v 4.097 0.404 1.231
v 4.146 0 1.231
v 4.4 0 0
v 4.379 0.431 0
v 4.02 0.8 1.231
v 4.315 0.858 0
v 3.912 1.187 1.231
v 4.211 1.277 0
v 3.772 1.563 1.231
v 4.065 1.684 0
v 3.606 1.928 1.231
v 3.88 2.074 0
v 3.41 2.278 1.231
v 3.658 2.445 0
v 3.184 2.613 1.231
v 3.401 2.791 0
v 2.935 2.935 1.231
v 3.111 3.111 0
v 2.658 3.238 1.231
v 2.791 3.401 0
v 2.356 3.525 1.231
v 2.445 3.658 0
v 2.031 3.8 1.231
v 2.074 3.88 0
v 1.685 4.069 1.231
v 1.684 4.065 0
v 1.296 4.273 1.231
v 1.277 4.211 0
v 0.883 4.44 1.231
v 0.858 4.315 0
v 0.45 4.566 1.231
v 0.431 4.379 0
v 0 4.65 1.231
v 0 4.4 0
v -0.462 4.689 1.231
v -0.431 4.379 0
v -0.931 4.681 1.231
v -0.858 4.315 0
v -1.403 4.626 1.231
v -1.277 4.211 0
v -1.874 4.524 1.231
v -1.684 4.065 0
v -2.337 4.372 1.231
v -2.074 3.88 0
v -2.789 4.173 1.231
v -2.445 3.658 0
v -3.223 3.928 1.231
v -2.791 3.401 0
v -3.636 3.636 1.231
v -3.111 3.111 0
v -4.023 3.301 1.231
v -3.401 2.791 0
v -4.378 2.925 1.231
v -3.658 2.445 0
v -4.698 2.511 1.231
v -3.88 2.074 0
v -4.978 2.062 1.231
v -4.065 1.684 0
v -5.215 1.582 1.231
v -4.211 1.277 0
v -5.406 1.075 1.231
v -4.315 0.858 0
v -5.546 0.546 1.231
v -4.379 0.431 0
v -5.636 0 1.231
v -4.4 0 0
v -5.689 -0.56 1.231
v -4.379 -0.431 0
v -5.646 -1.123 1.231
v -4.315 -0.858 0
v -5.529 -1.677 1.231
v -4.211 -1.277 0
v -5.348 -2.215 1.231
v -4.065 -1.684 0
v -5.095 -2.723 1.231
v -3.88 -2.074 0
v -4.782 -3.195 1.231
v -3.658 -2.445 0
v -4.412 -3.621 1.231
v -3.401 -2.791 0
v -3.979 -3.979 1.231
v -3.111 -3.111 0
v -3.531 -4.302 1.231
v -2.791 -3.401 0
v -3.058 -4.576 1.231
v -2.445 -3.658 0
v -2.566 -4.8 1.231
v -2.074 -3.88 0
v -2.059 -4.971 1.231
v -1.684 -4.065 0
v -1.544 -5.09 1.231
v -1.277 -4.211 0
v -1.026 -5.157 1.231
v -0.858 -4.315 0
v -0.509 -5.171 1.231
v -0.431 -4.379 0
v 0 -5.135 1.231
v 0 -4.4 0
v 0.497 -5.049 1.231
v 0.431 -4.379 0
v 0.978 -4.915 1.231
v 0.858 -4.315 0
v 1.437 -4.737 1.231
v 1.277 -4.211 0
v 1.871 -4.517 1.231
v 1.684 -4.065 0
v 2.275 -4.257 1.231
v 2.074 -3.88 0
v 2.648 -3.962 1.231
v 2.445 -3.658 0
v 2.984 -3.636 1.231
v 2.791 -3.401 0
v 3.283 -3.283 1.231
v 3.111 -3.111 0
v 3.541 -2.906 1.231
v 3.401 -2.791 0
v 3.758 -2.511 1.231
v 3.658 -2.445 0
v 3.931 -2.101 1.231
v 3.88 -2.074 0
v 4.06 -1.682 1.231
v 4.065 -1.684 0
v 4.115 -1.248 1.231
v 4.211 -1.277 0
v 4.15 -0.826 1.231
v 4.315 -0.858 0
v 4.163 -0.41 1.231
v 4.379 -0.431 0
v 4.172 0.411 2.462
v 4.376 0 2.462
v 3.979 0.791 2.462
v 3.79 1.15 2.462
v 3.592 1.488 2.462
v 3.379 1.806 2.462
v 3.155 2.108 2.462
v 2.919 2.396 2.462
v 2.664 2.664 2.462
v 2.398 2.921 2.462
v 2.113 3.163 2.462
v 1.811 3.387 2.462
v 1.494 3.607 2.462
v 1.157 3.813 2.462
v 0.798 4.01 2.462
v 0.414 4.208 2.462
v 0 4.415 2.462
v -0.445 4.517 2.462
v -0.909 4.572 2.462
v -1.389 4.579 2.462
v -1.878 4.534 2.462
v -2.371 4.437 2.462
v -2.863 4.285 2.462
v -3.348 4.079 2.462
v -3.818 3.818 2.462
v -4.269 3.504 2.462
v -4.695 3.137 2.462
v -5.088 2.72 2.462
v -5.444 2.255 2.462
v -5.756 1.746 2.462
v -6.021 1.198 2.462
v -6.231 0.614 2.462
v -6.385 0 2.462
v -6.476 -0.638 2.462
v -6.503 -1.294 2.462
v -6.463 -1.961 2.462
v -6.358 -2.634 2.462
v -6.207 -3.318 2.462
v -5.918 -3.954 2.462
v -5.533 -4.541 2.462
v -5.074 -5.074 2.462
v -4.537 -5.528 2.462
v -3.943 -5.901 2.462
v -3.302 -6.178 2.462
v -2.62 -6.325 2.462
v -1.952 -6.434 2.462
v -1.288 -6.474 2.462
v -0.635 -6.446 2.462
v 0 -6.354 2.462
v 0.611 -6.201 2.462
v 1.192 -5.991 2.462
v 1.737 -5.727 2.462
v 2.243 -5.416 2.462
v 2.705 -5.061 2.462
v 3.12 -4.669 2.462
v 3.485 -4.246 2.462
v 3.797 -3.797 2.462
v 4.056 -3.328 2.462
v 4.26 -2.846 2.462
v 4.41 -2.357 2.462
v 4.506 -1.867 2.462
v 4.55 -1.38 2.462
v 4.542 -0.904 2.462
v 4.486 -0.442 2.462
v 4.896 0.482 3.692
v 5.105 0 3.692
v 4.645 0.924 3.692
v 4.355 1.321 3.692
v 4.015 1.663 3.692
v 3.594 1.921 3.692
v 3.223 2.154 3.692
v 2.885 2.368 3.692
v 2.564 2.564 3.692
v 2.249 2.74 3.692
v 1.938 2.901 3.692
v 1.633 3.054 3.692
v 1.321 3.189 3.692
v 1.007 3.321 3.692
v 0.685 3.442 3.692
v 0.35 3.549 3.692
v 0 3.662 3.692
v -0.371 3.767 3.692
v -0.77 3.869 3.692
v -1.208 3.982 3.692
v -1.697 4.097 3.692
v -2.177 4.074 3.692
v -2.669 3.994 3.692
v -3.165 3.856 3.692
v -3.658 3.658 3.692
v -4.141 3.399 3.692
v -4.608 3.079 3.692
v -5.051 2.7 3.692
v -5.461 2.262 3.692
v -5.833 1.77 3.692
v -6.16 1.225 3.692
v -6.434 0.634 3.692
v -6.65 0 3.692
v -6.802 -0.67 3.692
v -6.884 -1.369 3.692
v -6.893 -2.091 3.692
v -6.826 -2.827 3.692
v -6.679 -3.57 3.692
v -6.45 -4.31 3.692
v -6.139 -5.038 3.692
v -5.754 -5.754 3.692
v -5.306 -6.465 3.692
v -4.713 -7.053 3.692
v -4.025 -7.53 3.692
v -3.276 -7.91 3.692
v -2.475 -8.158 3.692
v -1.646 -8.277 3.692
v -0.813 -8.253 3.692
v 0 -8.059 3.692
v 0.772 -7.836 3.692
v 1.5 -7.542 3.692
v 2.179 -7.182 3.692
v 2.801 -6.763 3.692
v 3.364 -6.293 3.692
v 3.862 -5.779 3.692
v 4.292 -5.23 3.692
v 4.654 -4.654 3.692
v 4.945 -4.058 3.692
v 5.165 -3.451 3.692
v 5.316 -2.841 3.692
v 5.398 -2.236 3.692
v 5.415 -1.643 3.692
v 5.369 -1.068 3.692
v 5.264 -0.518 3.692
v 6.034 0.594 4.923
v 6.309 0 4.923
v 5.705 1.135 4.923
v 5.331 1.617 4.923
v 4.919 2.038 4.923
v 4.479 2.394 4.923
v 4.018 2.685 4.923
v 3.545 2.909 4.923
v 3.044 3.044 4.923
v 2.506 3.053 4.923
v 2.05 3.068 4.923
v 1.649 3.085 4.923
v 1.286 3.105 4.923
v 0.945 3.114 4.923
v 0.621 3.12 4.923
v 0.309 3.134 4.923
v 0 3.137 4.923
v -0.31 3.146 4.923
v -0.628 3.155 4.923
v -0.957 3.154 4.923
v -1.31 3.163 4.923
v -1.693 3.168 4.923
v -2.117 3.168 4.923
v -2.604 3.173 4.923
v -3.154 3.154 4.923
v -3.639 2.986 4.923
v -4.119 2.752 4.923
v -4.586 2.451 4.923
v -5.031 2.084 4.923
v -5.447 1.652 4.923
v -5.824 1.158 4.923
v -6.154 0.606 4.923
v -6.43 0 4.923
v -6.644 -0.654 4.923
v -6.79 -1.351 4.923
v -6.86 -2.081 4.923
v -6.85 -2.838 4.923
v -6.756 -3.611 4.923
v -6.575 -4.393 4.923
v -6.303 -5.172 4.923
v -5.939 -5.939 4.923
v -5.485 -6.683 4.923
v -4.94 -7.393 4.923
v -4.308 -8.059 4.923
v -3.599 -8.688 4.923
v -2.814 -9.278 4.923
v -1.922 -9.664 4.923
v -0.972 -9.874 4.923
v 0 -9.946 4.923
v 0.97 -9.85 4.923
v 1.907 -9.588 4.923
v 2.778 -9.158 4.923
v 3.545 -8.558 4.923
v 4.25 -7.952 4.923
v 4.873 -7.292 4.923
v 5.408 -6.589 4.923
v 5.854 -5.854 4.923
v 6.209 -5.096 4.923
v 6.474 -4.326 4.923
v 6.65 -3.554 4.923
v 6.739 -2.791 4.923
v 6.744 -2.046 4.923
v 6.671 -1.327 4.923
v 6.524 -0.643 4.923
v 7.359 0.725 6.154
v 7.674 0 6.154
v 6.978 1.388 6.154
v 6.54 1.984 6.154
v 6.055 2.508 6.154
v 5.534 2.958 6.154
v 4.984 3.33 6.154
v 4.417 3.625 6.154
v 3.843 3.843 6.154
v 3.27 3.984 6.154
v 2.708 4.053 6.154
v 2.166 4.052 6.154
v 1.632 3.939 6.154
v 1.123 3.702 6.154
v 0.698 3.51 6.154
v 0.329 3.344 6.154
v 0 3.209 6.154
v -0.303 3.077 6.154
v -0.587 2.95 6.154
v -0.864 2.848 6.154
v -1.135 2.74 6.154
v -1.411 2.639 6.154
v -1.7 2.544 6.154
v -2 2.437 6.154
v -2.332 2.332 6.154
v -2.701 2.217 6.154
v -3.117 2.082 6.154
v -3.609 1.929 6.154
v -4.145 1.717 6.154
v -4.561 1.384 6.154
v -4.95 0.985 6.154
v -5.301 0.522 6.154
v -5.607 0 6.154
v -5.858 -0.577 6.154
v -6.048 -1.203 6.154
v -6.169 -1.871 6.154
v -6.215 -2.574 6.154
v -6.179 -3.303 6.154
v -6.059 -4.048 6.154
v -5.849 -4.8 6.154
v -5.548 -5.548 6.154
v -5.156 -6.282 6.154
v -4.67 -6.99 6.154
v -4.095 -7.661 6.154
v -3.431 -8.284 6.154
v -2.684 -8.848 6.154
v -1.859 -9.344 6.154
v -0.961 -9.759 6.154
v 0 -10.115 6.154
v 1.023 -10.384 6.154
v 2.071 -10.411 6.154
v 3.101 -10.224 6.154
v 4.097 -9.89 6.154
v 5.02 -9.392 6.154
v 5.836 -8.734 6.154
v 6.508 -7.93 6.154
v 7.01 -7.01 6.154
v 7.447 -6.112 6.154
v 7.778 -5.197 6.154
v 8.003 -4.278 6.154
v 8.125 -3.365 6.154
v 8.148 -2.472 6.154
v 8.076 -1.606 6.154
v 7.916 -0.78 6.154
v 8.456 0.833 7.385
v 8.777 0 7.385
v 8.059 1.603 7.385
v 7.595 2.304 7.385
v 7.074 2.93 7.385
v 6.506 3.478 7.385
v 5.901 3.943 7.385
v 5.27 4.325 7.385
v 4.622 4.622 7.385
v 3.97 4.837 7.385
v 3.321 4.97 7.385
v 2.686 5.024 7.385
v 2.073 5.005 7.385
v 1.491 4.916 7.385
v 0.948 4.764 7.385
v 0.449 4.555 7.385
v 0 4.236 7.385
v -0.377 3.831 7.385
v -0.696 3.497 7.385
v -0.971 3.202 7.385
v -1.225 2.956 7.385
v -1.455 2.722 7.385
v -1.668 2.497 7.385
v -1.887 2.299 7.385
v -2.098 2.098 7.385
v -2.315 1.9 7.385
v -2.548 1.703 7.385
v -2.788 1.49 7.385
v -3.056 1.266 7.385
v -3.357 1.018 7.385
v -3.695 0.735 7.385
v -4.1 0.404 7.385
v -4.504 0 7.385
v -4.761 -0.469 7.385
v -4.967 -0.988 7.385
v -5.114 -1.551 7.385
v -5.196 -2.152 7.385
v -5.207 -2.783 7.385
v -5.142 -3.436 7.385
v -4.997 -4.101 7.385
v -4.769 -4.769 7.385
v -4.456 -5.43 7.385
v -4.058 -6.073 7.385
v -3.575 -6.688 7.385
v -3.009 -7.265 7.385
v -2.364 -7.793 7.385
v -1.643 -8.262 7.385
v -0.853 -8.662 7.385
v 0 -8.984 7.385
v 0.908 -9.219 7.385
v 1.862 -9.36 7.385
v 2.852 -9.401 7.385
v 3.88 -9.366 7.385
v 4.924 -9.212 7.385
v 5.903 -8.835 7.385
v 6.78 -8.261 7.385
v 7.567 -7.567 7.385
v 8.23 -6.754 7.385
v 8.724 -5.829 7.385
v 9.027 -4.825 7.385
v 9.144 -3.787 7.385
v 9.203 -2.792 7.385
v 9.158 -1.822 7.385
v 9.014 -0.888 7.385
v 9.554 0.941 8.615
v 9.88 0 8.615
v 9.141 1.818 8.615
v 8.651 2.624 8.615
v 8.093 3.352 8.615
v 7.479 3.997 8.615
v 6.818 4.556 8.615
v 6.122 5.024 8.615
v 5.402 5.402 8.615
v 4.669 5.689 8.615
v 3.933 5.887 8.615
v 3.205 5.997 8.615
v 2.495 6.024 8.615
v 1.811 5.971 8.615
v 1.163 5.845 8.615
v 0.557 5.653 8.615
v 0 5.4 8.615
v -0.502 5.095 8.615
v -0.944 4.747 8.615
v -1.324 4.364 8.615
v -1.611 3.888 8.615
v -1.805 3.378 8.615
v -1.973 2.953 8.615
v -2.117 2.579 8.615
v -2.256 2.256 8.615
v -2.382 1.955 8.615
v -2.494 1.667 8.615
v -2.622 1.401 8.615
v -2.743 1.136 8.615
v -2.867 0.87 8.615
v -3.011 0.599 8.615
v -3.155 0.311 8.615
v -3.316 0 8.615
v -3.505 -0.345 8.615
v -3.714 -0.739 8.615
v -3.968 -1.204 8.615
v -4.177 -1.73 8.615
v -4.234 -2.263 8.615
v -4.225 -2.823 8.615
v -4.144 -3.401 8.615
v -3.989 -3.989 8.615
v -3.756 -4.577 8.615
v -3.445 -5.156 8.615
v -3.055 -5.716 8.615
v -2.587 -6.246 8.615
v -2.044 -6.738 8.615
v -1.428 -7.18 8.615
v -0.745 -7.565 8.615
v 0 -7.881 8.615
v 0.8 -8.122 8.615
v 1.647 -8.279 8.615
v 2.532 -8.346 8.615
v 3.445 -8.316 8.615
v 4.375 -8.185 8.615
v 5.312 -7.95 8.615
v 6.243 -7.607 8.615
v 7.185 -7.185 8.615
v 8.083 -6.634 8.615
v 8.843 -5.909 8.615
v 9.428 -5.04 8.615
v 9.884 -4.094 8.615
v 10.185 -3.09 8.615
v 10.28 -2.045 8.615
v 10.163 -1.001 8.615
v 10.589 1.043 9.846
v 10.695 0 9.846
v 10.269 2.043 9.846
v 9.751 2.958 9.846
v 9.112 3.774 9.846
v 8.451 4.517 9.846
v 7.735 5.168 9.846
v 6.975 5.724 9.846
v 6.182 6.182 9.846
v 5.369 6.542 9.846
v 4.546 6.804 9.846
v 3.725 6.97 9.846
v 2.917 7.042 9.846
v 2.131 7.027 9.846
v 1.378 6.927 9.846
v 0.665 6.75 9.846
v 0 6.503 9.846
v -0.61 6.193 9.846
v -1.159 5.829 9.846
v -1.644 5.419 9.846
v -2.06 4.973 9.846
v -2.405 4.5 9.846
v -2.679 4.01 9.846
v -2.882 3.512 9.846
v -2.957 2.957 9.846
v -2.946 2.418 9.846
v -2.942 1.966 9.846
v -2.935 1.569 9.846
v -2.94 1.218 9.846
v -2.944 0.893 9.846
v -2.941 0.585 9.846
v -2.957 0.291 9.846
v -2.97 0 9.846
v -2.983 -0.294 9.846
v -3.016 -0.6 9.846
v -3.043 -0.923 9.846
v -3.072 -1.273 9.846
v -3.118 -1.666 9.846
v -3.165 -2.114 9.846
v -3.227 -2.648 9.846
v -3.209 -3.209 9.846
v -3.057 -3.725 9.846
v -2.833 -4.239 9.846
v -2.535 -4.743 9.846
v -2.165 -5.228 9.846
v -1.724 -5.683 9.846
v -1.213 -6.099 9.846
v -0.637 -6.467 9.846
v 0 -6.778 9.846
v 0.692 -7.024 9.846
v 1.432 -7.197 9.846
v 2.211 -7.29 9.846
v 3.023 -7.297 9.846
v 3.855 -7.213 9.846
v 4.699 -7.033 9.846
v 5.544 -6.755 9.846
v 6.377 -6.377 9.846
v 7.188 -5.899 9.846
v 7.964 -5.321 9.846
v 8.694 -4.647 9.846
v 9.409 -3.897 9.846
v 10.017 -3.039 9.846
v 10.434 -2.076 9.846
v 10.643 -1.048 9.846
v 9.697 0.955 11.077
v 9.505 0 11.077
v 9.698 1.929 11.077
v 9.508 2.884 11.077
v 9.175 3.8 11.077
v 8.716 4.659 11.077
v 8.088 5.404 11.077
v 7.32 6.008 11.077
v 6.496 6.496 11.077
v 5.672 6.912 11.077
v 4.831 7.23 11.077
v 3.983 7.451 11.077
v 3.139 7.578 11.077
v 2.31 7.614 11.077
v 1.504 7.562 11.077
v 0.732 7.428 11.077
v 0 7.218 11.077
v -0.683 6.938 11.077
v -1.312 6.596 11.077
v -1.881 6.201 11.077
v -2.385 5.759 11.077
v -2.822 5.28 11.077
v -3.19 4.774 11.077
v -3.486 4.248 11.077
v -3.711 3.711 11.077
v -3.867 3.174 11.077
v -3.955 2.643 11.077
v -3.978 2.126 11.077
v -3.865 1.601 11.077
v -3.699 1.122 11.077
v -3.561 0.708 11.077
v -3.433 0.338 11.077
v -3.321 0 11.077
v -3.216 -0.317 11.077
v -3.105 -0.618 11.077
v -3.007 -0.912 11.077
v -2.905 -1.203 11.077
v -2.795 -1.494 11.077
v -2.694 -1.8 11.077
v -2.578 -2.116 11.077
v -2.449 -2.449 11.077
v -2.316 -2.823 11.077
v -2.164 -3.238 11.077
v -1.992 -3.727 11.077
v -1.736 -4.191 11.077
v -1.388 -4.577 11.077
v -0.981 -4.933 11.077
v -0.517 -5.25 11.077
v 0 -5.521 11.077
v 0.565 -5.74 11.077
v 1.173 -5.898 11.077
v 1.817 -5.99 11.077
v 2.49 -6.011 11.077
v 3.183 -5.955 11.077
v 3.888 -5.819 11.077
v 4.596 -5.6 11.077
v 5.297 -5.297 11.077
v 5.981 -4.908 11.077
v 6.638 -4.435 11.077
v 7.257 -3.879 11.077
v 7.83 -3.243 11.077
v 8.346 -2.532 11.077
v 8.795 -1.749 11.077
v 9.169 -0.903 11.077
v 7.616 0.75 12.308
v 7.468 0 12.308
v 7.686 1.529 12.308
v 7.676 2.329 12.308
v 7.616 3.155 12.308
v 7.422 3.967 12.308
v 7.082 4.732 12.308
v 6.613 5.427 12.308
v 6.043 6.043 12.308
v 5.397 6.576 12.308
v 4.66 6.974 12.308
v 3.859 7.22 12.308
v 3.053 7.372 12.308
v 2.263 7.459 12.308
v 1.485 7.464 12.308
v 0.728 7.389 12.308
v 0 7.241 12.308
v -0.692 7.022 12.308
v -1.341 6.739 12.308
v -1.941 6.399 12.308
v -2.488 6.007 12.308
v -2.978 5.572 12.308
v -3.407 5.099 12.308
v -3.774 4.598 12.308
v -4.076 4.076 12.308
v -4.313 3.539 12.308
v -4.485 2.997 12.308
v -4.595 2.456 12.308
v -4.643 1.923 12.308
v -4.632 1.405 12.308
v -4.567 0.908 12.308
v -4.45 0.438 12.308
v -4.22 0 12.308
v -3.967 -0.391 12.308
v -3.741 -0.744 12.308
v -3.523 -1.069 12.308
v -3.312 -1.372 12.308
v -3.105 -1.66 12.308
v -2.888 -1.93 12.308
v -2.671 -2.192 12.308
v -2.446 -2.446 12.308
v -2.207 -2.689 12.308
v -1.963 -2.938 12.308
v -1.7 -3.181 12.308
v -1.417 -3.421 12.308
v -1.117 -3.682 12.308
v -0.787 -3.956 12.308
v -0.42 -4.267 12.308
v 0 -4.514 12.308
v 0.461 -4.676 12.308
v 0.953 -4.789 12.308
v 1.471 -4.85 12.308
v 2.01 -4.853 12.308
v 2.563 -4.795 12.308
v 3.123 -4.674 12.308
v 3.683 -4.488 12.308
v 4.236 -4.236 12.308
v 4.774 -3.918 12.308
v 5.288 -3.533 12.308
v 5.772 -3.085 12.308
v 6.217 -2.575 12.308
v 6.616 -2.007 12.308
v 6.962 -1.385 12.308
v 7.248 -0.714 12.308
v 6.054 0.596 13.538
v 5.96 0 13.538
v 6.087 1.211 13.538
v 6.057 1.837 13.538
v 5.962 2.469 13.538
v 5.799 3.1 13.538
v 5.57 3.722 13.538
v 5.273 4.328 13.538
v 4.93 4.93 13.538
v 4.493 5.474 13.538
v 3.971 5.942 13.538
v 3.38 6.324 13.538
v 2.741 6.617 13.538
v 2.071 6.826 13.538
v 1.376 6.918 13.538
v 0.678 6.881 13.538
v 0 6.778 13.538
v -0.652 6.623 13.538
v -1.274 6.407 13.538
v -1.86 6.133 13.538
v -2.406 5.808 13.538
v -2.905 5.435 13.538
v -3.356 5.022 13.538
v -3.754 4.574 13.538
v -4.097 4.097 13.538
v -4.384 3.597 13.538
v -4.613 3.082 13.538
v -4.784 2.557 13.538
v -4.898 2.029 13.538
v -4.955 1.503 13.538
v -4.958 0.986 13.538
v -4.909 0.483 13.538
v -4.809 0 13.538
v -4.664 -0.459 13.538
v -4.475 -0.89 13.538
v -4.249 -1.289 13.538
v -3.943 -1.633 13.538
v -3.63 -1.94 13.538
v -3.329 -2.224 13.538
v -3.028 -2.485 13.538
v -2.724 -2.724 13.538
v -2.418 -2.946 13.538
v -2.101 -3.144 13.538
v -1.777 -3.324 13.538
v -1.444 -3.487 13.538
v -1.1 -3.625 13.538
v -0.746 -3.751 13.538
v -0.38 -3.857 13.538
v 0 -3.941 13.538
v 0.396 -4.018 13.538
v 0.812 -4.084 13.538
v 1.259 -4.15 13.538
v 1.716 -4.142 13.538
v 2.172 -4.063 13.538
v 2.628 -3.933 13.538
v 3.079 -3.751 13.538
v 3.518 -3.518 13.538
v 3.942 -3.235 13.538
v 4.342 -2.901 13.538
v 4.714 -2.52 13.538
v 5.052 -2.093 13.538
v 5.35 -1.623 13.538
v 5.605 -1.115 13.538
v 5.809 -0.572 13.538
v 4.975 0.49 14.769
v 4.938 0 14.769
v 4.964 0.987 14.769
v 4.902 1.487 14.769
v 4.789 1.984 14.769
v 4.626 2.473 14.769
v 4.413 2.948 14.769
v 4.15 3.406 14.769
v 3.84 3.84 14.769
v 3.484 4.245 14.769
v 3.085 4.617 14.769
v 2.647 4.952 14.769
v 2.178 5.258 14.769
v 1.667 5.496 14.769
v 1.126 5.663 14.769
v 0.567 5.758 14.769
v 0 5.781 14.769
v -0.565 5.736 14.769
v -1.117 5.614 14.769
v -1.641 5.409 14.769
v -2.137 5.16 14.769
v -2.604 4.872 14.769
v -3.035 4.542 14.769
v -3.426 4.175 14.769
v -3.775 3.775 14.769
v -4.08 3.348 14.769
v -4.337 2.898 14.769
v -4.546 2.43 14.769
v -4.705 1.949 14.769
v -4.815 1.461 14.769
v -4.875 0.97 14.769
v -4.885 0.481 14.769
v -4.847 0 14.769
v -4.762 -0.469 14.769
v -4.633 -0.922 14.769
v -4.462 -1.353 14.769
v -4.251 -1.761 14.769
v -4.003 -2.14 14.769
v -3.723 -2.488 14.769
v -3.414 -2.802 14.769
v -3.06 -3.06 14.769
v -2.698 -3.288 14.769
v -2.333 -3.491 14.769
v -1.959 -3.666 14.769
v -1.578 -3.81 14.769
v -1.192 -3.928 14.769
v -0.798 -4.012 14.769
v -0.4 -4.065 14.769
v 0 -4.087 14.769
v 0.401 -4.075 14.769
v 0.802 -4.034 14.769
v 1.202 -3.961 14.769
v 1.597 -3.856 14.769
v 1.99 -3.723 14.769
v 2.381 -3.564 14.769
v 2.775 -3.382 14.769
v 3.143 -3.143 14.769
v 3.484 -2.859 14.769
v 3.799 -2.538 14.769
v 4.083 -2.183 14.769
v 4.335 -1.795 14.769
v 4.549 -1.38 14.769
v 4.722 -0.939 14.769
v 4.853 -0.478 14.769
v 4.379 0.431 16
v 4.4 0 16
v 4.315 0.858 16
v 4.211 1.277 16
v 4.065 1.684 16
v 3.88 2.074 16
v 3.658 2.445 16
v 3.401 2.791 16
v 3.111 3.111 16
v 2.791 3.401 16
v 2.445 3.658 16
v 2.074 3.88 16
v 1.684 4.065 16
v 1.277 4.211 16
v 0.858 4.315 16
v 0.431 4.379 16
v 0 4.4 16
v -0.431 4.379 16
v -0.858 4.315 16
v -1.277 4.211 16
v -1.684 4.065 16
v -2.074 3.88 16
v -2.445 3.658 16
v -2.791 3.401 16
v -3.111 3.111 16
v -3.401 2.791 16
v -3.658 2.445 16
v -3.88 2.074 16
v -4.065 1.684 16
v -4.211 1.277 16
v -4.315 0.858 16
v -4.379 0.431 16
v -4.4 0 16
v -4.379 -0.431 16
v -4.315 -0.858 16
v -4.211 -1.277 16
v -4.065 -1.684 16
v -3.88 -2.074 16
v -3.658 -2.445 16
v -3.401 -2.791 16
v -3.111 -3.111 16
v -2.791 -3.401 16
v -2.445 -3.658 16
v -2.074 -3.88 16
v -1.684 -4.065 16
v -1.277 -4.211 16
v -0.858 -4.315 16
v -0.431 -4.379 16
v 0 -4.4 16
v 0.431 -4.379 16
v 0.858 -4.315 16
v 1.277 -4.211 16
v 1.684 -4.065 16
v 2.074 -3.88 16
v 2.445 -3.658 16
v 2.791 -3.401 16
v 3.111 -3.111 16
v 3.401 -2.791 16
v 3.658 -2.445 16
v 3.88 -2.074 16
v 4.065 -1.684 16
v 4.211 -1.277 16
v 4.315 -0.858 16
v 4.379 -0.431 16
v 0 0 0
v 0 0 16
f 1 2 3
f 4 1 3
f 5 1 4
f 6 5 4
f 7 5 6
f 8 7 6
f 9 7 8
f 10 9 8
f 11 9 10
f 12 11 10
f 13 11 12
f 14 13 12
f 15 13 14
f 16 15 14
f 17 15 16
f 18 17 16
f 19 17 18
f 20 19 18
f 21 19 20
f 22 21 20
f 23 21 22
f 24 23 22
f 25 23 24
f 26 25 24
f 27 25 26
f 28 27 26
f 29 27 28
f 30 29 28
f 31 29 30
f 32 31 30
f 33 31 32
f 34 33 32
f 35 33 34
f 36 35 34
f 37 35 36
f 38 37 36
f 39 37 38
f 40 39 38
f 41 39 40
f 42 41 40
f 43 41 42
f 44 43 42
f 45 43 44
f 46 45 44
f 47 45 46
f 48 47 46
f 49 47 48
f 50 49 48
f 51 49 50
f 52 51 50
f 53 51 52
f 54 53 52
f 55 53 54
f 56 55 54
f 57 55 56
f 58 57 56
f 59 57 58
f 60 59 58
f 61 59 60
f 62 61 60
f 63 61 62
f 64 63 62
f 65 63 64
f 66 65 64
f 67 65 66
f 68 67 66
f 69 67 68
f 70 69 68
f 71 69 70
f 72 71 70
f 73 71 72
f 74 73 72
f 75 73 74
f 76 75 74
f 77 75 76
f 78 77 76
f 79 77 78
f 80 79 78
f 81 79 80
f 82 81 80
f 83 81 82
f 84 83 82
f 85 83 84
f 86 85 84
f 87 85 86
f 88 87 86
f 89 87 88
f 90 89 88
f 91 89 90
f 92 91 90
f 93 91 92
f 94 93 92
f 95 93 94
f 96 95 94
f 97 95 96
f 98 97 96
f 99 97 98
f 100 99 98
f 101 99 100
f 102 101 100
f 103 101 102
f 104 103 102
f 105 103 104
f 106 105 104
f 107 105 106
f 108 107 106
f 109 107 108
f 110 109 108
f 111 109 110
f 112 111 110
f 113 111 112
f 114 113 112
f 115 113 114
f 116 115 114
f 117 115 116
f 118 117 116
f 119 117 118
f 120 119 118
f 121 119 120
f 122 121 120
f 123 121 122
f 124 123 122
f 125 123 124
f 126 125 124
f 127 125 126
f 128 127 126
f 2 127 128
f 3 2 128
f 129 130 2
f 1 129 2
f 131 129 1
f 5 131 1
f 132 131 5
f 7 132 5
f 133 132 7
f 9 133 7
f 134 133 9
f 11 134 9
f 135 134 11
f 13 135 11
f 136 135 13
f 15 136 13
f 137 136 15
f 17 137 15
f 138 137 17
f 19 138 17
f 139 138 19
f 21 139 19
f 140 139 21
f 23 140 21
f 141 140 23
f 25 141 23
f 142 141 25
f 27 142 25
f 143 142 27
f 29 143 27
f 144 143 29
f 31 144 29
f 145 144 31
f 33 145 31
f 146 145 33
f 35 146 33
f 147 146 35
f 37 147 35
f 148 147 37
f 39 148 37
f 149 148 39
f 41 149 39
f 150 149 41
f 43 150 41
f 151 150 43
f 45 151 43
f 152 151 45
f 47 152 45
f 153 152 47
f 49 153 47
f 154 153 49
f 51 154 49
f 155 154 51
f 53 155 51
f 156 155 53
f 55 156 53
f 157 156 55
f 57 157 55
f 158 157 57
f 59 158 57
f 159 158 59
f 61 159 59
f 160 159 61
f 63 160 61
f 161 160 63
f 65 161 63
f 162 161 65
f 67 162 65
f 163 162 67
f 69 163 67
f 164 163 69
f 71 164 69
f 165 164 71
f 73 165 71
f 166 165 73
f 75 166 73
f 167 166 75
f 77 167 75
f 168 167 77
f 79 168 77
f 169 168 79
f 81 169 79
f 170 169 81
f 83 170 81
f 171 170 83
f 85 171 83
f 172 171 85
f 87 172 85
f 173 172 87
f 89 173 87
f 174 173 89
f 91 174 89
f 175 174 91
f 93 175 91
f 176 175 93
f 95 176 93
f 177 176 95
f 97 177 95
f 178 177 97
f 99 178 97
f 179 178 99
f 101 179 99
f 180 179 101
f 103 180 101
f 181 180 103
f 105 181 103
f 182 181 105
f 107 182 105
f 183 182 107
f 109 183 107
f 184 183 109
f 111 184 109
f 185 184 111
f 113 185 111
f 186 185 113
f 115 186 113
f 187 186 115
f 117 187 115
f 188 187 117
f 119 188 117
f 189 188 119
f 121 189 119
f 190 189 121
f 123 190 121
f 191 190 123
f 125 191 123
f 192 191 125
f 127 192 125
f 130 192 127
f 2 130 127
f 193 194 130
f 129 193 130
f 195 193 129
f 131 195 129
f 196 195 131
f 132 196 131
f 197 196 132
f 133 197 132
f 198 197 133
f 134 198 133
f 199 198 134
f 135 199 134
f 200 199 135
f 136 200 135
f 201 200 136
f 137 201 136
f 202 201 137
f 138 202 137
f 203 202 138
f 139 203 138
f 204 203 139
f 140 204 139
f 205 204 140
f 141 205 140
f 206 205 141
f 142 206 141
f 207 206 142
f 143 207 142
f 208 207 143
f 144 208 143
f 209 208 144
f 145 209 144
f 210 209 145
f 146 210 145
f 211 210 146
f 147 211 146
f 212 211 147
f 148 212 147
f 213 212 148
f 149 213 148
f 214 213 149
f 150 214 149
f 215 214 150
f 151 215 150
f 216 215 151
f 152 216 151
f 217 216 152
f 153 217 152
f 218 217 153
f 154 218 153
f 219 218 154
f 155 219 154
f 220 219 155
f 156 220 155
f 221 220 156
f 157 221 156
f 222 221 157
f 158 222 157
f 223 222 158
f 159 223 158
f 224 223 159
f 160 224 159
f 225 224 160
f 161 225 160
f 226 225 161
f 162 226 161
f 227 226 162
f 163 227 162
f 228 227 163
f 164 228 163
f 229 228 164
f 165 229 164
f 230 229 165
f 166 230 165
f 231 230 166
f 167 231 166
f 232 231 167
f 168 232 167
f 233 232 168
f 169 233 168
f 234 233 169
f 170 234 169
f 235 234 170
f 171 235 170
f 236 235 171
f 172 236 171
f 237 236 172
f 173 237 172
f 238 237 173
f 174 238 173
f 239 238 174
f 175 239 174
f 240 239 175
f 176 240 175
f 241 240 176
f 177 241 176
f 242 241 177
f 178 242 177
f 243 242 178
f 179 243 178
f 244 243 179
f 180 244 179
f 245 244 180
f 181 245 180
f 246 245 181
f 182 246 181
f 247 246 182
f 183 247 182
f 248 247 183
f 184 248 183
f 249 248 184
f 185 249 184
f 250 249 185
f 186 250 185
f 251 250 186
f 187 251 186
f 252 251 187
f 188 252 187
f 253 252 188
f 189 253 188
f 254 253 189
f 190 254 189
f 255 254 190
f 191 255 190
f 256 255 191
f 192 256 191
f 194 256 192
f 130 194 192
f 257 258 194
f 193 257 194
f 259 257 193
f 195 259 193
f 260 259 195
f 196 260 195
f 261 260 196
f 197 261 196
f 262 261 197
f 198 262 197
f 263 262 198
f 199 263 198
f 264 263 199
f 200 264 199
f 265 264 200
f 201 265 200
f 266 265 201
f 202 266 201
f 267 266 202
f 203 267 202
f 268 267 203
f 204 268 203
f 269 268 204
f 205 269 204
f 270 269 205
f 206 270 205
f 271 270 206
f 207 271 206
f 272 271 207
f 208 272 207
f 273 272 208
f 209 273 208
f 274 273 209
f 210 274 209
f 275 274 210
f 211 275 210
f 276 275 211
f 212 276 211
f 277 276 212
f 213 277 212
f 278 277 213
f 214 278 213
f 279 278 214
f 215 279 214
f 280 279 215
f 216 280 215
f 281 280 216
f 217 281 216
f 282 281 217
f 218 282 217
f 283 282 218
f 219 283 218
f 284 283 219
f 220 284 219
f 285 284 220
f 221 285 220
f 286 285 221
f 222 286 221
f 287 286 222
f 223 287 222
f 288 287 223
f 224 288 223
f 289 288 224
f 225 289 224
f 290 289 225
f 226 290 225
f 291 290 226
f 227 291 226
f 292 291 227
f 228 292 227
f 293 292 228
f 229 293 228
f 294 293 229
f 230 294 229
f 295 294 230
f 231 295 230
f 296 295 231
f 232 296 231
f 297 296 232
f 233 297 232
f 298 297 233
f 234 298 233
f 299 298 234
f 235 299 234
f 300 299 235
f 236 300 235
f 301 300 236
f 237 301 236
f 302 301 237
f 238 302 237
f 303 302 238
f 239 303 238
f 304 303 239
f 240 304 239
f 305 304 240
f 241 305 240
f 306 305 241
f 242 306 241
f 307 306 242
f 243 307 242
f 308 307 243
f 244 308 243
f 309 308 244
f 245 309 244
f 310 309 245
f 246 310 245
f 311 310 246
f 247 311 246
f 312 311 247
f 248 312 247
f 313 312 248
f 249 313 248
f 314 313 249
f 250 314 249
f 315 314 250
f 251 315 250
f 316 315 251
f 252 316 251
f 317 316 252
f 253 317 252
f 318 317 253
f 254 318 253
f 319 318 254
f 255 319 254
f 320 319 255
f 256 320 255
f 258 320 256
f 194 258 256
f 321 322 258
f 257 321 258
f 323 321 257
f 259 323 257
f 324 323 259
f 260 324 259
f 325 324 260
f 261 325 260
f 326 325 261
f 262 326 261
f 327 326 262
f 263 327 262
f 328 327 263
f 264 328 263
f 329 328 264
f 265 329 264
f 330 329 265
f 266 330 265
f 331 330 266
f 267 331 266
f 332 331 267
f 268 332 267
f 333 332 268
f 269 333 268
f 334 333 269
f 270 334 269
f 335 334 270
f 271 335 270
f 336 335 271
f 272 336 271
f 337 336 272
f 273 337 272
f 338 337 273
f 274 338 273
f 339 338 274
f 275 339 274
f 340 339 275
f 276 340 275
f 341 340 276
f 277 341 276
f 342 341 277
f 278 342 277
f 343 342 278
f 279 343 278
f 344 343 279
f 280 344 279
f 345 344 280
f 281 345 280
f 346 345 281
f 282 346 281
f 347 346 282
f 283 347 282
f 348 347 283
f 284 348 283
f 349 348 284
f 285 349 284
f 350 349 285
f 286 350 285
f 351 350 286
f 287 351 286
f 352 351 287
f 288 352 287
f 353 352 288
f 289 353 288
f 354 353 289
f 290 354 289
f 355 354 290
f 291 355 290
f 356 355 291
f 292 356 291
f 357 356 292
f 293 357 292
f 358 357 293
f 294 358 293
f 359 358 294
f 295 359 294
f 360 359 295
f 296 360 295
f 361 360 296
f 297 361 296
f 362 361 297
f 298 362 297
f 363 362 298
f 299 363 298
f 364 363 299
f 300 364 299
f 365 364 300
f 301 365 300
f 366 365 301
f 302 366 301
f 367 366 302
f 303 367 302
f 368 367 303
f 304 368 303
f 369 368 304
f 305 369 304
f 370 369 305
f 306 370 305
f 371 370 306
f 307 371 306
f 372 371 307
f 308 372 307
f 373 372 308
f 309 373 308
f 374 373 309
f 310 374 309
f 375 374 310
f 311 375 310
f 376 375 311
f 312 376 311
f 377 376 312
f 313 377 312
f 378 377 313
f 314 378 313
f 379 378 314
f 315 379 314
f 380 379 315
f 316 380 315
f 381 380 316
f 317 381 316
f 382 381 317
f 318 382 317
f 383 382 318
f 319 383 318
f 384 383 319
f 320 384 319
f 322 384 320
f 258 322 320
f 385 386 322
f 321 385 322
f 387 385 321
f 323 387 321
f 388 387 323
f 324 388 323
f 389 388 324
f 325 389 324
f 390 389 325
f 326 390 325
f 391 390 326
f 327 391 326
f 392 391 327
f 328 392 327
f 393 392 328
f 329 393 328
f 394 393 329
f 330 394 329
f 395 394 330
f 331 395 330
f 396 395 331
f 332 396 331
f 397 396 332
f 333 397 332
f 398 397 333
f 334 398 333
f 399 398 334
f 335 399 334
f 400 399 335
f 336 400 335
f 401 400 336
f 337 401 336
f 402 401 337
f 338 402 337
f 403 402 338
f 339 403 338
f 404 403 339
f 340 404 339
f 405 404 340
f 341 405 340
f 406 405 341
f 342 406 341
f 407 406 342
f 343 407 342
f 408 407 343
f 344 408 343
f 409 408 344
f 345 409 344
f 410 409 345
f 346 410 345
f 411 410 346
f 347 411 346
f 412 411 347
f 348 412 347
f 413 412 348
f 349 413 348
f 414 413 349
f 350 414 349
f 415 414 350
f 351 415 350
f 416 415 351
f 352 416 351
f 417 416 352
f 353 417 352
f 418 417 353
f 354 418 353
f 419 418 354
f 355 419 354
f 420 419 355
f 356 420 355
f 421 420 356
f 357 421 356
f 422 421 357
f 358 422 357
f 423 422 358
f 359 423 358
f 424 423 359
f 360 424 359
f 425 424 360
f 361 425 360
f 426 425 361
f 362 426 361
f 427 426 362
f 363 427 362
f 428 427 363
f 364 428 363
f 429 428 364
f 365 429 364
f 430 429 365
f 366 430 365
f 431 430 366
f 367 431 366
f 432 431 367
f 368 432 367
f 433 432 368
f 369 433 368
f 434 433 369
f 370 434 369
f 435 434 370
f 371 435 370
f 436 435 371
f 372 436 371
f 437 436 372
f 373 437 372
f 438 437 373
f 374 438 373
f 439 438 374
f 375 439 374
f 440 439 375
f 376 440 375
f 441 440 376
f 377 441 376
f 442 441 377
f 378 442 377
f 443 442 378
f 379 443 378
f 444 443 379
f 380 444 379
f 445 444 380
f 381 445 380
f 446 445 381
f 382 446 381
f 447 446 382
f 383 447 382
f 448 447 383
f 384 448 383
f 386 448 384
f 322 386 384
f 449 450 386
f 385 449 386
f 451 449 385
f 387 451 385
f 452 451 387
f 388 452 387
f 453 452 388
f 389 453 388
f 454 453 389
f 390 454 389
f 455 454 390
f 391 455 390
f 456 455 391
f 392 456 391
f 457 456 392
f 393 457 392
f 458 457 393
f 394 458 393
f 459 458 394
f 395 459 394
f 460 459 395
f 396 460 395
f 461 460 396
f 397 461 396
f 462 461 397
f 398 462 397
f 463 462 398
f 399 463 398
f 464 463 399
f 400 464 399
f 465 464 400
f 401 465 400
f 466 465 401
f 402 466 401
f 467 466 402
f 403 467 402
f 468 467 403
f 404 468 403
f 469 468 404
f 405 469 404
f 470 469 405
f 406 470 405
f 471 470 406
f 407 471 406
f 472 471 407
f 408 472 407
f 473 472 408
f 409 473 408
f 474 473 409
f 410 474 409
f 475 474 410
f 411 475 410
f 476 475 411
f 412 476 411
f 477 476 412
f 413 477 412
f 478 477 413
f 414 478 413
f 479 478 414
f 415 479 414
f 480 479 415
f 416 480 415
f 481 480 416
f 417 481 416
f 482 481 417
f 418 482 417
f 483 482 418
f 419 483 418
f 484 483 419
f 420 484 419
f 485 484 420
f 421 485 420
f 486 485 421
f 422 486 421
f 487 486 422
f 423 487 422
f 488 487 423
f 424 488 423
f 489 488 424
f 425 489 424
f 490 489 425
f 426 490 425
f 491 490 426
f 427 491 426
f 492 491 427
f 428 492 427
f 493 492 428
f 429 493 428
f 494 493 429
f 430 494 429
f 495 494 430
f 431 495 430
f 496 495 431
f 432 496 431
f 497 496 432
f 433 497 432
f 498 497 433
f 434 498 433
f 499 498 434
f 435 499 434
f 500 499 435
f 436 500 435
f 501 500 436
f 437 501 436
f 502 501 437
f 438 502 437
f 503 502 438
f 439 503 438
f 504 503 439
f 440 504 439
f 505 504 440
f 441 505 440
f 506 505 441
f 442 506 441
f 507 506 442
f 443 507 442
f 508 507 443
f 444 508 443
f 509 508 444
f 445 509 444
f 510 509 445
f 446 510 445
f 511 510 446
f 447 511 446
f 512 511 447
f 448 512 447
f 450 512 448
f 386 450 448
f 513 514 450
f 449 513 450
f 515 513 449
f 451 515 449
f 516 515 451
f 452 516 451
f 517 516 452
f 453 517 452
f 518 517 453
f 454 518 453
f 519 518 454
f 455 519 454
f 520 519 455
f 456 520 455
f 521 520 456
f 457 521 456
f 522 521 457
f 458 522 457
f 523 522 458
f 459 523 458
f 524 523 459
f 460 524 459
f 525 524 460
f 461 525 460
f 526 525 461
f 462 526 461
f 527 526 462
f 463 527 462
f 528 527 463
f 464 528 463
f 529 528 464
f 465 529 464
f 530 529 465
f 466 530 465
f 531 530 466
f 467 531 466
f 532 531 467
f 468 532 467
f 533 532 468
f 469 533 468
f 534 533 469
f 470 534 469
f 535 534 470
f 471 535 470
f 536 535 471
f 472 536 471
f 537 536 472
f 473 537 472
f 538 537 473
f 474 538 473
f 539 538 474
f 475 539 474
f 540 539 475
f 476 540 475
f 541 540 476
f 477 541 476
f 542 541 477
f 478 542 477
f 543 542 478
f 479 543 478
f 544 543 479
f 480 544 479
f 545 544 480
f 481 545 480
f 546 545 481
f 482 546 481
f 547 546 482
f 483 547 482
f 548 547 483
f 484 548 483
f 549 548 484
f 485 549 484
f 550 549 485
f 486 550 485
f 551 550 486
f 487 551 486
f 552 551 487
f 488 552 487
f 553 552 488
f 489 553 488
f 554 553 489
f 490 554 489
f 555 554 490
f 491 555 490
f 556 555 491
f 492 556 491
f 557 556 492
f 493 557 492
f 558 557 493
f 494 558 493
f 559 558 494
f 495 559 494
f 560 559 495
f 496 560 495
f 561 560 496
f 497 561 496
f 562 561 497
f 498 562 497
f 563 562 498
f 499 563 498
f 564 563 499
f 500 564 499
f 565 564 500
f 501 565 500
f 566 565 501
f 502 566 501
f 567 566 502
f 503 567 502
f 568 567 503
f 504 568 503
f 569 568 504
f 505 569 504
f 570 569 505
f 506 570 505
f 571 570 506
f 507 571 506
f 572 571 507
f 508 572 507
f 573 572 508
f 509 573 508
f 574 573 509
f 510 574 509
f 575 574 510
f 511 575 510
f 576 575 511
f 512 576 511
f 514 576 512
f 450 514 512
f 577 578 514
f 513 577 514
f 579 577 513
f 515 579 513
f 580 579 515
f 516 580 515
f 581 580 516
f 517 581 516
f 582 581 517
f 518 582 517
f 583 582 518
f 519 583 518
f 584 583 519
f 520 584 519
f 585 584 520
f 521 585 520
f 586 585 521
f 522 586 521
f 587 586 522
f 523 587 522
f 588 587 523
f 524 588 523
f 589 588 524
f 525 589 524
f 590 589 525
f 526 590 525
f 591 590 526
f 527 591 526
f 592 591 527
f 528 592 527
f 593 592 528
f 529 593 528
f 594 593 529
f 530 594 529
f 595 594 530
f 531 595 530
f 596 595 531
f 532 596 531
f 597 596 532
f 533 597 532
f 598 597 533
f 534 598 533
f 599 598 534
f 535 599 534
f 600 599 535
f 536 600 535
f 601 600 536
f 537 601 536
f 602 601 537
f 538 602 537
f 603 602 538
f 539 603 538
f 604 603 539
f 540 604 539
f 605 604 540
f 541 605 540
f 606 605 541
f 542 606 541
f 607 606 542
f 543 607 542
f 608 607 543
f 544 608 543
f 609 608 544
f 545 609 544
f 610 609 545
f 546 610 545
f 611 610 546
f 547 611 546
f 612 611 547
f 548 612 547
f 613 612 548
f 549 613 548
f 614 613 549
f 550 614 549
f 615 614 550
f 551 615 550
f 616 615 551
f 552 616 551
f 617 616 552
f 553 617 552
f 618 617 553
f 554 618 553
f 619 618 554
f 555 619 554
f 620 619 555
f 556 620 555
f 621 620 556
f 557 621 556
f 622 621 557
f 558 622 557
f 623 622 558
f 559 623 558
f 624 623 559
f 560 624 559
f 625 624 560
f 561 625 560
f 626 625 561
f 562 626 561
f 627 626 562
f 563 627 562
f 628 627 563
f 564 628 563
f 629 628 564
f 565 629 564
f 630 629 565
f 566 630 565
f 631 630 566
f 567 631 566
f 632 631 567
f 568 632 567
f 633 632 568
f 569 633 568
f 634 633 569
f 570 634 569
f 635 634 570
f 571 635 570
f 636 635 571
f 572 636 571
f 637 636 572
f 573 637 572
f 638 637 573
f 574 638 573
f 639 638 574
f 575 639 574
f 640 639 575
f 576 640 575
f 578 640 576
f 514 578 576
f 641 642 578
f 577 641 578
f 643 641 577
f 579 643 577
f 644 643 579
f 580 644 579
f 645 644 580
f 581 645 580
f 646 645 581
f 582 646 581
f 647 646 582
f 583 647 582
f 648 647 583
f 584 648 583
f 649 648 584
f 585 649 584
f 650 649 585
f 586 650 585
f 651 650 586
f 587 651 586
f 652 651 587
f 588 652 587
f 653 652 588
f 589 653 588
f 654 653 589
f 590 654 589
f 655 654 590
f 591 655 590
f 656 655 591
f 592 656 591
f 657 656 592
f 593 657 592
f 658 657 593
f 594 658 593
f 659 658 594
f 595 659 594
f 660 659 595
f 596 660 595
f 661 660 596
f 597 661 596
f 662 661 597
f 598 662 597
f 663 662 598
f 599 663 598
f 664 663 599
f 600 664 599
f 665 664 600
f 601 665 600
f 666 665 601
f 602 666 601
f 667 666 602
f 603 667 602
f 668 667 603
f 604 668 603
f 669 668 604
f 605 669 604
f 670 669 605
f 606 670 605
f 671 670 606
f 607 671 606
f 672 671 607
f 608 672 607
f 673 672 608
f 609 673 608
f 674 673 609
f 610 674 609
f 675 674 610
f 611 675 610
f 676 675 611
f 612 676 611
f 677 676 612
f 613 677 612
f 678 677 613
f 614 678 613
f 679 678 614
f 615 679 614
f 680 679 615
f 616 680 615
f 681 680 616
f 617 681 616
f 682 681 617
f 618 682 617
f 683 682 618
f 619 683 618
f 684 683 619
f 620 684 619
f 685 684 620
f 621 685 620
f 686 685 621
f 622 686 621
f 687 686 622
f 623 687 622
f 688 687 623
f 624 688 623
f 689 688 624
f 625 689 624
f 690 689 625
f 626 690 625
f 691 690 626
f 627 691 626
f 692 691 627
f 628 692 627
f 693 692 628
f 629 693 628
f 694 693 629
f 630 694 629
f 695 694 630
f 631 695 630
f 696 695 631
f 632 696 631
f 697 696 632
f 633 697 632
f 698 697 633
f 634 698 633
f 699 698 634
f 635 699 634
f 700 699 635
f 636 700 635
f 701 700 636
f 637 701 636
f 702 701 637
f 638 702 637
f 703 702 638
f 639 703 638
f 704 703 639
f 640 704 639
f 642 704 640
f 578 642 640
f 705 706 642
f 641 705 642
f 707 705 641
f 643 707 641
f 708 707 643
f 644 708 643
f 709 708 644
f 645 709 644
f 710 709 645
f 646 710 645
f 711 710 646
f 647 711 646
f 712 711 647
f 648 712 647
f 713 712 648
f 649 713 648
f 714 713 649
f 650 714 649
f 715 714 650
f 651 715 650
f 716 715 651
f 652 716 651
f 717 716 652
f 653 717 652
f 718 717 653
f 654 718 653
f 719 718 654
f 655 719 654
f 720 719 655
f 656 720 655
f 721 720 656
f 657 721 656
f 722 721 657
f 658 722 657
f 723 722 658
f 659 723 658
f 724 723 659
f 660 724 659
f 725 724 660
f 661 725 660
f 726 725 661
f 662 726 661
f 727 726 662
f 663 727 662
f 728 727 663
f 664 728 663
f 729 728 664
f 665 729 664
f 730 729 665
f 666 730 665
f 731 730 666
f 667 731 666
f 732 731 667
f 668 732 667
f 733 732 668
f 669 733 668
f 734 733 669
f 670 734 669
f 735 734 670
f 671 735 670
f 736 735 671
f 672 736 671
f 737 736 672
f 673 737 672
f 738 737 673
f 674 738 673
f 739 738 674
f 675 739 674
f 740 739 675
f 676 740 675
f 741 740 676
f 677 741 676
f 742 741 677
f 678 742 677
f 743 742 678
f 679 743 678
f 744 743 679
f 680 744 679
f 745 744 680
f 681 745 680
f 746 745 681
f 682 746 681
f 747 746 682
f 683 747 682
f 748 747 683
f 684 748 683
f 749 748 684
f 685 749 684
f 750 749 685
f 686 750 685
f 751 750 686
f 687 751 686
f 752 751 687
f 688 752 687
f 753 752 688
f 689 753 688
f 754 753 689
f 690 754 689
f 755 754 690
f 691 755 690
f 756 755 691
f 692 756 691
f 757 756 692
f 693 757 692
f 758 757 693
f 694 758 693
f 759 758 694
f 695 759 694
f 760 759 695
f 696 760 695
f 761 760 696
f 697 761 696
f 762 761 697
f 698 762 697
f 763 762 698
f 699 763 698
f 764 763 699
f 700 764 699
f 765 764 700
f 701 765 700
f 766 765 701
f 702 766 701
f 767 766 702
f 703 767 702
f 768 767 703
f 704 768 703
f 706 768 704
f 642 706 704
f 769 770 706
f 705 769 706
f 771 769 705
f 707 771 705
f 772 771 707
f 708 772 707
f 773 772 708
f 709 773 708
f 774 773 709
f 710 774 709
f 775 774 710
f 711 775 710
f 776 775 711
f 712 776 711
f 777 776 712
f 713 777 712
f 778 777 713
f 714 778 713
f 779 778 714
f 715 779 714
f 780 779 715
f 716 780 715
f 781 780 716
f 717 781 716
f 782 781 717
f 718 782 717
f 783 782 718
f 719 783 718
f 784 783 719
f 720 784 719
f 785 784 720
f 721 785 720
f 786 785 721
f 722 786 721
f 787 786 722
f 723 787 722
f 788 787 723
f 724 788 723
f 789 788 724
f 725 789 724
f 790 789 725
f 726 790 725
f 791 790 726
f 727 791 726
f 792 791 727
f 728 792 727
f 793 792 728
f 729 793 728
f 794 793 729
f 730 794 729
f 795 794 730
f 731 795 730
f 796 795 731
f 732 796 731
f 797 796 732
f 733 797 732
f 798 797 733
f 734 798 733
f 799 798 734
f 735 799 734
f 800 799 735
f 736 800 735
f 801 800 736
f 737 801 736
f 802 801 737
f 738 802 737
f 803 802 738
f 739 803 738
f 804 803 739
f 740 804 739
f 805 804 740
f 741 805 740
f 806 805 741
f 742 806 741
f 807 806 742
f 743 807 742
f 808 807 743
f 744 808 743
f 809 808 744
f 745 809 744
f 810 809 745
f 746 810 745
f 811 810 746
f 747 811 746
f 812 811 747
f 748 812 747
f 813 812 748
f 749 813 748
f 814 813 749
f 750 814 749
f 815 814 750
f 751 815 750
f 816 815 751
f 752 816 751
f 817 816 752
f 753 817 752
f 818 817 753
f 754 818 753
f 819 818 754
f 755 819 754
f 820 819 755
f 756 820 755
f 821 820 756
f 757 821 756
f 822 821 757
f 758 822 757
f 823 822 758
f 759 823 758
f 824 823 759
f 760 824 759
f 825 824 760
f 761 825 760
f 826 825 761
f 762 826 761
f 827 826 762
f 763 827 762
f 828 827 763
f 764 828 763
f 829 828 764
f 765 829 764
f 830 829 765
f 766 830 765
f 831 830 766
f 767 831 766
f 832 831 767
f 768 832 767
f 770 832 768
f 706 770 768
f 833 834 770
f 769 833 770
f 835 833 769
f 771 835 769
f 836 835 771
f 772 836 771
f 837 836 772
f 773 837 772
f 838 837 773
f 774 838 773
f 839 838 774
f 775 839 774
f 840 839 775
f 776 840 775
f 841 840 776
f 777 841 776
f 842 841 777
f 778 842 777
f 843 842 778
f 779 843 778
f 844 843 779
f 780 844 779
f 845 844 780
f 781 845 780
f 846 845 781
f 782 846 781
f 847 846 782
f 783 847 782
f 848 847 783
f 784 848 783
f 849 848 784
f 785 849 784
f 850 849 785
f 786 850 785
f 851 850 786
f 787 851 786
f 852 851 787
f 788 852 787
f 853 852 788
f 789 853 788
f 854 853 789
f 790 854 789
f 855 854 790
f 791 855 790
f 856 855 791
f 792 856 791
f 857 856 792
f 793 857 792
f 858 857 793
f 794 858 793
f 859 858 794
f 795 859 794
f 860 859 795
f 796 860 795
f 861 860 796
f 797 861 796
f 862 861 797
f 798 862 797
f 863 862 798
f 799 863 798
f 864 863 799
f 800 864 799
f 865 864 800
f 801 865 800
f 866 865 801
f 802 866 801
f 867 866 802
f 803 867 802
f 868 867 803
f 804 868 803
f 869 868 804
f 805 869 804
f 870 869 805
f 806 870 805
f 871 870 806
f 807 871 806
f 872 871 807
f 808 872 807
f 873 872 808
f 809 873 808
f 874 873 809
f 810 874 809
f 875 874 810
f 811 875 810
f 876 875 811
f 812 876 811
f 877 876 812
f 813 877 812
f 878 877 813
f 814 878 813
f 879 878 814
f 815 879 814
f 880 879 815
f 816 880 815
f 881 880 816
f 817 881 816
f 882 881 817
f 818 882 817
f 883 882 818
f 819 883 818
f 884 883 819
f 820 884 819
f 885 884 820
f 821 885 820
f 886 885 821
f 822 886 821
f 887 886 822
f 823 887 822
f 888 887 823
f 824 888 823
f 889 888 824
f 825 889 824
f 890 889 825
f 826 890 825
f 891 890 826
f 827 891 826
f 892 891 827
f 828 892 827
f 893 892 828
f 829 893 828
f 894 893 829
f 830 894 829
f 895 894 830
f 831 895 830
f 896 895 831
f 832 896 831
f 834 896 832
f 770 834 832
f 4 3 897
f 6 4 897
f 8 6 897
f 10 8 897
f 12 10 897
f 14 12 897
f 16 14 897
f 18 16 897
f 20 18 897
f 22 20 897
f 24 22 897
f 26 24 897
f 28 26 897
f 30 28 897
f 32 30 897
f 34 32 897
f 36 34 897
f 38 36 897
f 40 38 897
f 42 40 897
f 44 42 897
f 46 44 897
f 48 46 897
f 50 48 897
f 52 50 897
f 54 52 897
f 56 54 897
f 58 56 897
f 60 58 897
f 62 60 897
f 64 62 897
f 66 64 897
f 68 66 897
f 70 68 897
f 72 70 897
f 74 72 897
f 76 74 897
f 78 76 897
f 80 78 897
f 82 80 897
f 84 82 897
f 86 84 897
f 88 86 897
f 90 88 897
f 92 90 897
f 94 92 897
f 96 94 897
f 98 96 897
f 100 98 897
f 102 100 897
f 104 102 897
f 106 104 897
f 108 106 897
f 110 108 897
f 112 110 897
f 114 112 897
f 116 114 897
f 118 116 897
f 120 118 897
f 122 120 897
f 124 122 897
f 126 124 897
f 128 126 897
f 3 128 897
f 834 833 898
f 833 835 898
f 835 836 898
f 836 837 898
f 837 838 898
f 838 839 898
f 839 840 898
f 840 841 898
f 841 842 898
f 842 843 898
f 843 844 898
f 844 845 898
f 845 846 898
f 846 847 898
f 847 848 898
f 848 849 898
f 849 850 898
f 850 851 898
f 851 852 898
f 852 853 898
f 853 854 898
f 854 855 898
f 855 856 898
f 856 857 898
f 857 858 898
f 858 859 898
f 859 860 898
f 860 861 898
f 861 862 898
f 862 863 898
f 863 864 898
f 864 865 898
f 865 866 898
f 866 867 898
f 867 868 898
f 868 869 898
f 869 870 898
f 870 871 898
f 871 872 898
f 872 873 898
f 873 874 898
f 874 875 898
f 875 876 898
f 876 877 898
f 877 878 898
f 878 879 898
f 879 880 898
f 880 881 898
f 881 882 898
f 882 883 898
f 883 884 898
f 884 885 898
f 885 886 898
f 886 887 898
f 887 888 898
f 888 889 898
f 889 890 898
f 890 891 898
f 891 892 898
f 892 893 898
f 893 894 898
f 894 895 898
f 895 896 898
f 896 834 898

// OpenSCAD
// SPDX-License-Identifier: MIT
// Wrapper: render this file directly (NO -D needed, works in every shell):
//   openscad -o auger.stl examples/auger.scad
SHOW = "auger";
include <../tq_threads_examples.scad>;
